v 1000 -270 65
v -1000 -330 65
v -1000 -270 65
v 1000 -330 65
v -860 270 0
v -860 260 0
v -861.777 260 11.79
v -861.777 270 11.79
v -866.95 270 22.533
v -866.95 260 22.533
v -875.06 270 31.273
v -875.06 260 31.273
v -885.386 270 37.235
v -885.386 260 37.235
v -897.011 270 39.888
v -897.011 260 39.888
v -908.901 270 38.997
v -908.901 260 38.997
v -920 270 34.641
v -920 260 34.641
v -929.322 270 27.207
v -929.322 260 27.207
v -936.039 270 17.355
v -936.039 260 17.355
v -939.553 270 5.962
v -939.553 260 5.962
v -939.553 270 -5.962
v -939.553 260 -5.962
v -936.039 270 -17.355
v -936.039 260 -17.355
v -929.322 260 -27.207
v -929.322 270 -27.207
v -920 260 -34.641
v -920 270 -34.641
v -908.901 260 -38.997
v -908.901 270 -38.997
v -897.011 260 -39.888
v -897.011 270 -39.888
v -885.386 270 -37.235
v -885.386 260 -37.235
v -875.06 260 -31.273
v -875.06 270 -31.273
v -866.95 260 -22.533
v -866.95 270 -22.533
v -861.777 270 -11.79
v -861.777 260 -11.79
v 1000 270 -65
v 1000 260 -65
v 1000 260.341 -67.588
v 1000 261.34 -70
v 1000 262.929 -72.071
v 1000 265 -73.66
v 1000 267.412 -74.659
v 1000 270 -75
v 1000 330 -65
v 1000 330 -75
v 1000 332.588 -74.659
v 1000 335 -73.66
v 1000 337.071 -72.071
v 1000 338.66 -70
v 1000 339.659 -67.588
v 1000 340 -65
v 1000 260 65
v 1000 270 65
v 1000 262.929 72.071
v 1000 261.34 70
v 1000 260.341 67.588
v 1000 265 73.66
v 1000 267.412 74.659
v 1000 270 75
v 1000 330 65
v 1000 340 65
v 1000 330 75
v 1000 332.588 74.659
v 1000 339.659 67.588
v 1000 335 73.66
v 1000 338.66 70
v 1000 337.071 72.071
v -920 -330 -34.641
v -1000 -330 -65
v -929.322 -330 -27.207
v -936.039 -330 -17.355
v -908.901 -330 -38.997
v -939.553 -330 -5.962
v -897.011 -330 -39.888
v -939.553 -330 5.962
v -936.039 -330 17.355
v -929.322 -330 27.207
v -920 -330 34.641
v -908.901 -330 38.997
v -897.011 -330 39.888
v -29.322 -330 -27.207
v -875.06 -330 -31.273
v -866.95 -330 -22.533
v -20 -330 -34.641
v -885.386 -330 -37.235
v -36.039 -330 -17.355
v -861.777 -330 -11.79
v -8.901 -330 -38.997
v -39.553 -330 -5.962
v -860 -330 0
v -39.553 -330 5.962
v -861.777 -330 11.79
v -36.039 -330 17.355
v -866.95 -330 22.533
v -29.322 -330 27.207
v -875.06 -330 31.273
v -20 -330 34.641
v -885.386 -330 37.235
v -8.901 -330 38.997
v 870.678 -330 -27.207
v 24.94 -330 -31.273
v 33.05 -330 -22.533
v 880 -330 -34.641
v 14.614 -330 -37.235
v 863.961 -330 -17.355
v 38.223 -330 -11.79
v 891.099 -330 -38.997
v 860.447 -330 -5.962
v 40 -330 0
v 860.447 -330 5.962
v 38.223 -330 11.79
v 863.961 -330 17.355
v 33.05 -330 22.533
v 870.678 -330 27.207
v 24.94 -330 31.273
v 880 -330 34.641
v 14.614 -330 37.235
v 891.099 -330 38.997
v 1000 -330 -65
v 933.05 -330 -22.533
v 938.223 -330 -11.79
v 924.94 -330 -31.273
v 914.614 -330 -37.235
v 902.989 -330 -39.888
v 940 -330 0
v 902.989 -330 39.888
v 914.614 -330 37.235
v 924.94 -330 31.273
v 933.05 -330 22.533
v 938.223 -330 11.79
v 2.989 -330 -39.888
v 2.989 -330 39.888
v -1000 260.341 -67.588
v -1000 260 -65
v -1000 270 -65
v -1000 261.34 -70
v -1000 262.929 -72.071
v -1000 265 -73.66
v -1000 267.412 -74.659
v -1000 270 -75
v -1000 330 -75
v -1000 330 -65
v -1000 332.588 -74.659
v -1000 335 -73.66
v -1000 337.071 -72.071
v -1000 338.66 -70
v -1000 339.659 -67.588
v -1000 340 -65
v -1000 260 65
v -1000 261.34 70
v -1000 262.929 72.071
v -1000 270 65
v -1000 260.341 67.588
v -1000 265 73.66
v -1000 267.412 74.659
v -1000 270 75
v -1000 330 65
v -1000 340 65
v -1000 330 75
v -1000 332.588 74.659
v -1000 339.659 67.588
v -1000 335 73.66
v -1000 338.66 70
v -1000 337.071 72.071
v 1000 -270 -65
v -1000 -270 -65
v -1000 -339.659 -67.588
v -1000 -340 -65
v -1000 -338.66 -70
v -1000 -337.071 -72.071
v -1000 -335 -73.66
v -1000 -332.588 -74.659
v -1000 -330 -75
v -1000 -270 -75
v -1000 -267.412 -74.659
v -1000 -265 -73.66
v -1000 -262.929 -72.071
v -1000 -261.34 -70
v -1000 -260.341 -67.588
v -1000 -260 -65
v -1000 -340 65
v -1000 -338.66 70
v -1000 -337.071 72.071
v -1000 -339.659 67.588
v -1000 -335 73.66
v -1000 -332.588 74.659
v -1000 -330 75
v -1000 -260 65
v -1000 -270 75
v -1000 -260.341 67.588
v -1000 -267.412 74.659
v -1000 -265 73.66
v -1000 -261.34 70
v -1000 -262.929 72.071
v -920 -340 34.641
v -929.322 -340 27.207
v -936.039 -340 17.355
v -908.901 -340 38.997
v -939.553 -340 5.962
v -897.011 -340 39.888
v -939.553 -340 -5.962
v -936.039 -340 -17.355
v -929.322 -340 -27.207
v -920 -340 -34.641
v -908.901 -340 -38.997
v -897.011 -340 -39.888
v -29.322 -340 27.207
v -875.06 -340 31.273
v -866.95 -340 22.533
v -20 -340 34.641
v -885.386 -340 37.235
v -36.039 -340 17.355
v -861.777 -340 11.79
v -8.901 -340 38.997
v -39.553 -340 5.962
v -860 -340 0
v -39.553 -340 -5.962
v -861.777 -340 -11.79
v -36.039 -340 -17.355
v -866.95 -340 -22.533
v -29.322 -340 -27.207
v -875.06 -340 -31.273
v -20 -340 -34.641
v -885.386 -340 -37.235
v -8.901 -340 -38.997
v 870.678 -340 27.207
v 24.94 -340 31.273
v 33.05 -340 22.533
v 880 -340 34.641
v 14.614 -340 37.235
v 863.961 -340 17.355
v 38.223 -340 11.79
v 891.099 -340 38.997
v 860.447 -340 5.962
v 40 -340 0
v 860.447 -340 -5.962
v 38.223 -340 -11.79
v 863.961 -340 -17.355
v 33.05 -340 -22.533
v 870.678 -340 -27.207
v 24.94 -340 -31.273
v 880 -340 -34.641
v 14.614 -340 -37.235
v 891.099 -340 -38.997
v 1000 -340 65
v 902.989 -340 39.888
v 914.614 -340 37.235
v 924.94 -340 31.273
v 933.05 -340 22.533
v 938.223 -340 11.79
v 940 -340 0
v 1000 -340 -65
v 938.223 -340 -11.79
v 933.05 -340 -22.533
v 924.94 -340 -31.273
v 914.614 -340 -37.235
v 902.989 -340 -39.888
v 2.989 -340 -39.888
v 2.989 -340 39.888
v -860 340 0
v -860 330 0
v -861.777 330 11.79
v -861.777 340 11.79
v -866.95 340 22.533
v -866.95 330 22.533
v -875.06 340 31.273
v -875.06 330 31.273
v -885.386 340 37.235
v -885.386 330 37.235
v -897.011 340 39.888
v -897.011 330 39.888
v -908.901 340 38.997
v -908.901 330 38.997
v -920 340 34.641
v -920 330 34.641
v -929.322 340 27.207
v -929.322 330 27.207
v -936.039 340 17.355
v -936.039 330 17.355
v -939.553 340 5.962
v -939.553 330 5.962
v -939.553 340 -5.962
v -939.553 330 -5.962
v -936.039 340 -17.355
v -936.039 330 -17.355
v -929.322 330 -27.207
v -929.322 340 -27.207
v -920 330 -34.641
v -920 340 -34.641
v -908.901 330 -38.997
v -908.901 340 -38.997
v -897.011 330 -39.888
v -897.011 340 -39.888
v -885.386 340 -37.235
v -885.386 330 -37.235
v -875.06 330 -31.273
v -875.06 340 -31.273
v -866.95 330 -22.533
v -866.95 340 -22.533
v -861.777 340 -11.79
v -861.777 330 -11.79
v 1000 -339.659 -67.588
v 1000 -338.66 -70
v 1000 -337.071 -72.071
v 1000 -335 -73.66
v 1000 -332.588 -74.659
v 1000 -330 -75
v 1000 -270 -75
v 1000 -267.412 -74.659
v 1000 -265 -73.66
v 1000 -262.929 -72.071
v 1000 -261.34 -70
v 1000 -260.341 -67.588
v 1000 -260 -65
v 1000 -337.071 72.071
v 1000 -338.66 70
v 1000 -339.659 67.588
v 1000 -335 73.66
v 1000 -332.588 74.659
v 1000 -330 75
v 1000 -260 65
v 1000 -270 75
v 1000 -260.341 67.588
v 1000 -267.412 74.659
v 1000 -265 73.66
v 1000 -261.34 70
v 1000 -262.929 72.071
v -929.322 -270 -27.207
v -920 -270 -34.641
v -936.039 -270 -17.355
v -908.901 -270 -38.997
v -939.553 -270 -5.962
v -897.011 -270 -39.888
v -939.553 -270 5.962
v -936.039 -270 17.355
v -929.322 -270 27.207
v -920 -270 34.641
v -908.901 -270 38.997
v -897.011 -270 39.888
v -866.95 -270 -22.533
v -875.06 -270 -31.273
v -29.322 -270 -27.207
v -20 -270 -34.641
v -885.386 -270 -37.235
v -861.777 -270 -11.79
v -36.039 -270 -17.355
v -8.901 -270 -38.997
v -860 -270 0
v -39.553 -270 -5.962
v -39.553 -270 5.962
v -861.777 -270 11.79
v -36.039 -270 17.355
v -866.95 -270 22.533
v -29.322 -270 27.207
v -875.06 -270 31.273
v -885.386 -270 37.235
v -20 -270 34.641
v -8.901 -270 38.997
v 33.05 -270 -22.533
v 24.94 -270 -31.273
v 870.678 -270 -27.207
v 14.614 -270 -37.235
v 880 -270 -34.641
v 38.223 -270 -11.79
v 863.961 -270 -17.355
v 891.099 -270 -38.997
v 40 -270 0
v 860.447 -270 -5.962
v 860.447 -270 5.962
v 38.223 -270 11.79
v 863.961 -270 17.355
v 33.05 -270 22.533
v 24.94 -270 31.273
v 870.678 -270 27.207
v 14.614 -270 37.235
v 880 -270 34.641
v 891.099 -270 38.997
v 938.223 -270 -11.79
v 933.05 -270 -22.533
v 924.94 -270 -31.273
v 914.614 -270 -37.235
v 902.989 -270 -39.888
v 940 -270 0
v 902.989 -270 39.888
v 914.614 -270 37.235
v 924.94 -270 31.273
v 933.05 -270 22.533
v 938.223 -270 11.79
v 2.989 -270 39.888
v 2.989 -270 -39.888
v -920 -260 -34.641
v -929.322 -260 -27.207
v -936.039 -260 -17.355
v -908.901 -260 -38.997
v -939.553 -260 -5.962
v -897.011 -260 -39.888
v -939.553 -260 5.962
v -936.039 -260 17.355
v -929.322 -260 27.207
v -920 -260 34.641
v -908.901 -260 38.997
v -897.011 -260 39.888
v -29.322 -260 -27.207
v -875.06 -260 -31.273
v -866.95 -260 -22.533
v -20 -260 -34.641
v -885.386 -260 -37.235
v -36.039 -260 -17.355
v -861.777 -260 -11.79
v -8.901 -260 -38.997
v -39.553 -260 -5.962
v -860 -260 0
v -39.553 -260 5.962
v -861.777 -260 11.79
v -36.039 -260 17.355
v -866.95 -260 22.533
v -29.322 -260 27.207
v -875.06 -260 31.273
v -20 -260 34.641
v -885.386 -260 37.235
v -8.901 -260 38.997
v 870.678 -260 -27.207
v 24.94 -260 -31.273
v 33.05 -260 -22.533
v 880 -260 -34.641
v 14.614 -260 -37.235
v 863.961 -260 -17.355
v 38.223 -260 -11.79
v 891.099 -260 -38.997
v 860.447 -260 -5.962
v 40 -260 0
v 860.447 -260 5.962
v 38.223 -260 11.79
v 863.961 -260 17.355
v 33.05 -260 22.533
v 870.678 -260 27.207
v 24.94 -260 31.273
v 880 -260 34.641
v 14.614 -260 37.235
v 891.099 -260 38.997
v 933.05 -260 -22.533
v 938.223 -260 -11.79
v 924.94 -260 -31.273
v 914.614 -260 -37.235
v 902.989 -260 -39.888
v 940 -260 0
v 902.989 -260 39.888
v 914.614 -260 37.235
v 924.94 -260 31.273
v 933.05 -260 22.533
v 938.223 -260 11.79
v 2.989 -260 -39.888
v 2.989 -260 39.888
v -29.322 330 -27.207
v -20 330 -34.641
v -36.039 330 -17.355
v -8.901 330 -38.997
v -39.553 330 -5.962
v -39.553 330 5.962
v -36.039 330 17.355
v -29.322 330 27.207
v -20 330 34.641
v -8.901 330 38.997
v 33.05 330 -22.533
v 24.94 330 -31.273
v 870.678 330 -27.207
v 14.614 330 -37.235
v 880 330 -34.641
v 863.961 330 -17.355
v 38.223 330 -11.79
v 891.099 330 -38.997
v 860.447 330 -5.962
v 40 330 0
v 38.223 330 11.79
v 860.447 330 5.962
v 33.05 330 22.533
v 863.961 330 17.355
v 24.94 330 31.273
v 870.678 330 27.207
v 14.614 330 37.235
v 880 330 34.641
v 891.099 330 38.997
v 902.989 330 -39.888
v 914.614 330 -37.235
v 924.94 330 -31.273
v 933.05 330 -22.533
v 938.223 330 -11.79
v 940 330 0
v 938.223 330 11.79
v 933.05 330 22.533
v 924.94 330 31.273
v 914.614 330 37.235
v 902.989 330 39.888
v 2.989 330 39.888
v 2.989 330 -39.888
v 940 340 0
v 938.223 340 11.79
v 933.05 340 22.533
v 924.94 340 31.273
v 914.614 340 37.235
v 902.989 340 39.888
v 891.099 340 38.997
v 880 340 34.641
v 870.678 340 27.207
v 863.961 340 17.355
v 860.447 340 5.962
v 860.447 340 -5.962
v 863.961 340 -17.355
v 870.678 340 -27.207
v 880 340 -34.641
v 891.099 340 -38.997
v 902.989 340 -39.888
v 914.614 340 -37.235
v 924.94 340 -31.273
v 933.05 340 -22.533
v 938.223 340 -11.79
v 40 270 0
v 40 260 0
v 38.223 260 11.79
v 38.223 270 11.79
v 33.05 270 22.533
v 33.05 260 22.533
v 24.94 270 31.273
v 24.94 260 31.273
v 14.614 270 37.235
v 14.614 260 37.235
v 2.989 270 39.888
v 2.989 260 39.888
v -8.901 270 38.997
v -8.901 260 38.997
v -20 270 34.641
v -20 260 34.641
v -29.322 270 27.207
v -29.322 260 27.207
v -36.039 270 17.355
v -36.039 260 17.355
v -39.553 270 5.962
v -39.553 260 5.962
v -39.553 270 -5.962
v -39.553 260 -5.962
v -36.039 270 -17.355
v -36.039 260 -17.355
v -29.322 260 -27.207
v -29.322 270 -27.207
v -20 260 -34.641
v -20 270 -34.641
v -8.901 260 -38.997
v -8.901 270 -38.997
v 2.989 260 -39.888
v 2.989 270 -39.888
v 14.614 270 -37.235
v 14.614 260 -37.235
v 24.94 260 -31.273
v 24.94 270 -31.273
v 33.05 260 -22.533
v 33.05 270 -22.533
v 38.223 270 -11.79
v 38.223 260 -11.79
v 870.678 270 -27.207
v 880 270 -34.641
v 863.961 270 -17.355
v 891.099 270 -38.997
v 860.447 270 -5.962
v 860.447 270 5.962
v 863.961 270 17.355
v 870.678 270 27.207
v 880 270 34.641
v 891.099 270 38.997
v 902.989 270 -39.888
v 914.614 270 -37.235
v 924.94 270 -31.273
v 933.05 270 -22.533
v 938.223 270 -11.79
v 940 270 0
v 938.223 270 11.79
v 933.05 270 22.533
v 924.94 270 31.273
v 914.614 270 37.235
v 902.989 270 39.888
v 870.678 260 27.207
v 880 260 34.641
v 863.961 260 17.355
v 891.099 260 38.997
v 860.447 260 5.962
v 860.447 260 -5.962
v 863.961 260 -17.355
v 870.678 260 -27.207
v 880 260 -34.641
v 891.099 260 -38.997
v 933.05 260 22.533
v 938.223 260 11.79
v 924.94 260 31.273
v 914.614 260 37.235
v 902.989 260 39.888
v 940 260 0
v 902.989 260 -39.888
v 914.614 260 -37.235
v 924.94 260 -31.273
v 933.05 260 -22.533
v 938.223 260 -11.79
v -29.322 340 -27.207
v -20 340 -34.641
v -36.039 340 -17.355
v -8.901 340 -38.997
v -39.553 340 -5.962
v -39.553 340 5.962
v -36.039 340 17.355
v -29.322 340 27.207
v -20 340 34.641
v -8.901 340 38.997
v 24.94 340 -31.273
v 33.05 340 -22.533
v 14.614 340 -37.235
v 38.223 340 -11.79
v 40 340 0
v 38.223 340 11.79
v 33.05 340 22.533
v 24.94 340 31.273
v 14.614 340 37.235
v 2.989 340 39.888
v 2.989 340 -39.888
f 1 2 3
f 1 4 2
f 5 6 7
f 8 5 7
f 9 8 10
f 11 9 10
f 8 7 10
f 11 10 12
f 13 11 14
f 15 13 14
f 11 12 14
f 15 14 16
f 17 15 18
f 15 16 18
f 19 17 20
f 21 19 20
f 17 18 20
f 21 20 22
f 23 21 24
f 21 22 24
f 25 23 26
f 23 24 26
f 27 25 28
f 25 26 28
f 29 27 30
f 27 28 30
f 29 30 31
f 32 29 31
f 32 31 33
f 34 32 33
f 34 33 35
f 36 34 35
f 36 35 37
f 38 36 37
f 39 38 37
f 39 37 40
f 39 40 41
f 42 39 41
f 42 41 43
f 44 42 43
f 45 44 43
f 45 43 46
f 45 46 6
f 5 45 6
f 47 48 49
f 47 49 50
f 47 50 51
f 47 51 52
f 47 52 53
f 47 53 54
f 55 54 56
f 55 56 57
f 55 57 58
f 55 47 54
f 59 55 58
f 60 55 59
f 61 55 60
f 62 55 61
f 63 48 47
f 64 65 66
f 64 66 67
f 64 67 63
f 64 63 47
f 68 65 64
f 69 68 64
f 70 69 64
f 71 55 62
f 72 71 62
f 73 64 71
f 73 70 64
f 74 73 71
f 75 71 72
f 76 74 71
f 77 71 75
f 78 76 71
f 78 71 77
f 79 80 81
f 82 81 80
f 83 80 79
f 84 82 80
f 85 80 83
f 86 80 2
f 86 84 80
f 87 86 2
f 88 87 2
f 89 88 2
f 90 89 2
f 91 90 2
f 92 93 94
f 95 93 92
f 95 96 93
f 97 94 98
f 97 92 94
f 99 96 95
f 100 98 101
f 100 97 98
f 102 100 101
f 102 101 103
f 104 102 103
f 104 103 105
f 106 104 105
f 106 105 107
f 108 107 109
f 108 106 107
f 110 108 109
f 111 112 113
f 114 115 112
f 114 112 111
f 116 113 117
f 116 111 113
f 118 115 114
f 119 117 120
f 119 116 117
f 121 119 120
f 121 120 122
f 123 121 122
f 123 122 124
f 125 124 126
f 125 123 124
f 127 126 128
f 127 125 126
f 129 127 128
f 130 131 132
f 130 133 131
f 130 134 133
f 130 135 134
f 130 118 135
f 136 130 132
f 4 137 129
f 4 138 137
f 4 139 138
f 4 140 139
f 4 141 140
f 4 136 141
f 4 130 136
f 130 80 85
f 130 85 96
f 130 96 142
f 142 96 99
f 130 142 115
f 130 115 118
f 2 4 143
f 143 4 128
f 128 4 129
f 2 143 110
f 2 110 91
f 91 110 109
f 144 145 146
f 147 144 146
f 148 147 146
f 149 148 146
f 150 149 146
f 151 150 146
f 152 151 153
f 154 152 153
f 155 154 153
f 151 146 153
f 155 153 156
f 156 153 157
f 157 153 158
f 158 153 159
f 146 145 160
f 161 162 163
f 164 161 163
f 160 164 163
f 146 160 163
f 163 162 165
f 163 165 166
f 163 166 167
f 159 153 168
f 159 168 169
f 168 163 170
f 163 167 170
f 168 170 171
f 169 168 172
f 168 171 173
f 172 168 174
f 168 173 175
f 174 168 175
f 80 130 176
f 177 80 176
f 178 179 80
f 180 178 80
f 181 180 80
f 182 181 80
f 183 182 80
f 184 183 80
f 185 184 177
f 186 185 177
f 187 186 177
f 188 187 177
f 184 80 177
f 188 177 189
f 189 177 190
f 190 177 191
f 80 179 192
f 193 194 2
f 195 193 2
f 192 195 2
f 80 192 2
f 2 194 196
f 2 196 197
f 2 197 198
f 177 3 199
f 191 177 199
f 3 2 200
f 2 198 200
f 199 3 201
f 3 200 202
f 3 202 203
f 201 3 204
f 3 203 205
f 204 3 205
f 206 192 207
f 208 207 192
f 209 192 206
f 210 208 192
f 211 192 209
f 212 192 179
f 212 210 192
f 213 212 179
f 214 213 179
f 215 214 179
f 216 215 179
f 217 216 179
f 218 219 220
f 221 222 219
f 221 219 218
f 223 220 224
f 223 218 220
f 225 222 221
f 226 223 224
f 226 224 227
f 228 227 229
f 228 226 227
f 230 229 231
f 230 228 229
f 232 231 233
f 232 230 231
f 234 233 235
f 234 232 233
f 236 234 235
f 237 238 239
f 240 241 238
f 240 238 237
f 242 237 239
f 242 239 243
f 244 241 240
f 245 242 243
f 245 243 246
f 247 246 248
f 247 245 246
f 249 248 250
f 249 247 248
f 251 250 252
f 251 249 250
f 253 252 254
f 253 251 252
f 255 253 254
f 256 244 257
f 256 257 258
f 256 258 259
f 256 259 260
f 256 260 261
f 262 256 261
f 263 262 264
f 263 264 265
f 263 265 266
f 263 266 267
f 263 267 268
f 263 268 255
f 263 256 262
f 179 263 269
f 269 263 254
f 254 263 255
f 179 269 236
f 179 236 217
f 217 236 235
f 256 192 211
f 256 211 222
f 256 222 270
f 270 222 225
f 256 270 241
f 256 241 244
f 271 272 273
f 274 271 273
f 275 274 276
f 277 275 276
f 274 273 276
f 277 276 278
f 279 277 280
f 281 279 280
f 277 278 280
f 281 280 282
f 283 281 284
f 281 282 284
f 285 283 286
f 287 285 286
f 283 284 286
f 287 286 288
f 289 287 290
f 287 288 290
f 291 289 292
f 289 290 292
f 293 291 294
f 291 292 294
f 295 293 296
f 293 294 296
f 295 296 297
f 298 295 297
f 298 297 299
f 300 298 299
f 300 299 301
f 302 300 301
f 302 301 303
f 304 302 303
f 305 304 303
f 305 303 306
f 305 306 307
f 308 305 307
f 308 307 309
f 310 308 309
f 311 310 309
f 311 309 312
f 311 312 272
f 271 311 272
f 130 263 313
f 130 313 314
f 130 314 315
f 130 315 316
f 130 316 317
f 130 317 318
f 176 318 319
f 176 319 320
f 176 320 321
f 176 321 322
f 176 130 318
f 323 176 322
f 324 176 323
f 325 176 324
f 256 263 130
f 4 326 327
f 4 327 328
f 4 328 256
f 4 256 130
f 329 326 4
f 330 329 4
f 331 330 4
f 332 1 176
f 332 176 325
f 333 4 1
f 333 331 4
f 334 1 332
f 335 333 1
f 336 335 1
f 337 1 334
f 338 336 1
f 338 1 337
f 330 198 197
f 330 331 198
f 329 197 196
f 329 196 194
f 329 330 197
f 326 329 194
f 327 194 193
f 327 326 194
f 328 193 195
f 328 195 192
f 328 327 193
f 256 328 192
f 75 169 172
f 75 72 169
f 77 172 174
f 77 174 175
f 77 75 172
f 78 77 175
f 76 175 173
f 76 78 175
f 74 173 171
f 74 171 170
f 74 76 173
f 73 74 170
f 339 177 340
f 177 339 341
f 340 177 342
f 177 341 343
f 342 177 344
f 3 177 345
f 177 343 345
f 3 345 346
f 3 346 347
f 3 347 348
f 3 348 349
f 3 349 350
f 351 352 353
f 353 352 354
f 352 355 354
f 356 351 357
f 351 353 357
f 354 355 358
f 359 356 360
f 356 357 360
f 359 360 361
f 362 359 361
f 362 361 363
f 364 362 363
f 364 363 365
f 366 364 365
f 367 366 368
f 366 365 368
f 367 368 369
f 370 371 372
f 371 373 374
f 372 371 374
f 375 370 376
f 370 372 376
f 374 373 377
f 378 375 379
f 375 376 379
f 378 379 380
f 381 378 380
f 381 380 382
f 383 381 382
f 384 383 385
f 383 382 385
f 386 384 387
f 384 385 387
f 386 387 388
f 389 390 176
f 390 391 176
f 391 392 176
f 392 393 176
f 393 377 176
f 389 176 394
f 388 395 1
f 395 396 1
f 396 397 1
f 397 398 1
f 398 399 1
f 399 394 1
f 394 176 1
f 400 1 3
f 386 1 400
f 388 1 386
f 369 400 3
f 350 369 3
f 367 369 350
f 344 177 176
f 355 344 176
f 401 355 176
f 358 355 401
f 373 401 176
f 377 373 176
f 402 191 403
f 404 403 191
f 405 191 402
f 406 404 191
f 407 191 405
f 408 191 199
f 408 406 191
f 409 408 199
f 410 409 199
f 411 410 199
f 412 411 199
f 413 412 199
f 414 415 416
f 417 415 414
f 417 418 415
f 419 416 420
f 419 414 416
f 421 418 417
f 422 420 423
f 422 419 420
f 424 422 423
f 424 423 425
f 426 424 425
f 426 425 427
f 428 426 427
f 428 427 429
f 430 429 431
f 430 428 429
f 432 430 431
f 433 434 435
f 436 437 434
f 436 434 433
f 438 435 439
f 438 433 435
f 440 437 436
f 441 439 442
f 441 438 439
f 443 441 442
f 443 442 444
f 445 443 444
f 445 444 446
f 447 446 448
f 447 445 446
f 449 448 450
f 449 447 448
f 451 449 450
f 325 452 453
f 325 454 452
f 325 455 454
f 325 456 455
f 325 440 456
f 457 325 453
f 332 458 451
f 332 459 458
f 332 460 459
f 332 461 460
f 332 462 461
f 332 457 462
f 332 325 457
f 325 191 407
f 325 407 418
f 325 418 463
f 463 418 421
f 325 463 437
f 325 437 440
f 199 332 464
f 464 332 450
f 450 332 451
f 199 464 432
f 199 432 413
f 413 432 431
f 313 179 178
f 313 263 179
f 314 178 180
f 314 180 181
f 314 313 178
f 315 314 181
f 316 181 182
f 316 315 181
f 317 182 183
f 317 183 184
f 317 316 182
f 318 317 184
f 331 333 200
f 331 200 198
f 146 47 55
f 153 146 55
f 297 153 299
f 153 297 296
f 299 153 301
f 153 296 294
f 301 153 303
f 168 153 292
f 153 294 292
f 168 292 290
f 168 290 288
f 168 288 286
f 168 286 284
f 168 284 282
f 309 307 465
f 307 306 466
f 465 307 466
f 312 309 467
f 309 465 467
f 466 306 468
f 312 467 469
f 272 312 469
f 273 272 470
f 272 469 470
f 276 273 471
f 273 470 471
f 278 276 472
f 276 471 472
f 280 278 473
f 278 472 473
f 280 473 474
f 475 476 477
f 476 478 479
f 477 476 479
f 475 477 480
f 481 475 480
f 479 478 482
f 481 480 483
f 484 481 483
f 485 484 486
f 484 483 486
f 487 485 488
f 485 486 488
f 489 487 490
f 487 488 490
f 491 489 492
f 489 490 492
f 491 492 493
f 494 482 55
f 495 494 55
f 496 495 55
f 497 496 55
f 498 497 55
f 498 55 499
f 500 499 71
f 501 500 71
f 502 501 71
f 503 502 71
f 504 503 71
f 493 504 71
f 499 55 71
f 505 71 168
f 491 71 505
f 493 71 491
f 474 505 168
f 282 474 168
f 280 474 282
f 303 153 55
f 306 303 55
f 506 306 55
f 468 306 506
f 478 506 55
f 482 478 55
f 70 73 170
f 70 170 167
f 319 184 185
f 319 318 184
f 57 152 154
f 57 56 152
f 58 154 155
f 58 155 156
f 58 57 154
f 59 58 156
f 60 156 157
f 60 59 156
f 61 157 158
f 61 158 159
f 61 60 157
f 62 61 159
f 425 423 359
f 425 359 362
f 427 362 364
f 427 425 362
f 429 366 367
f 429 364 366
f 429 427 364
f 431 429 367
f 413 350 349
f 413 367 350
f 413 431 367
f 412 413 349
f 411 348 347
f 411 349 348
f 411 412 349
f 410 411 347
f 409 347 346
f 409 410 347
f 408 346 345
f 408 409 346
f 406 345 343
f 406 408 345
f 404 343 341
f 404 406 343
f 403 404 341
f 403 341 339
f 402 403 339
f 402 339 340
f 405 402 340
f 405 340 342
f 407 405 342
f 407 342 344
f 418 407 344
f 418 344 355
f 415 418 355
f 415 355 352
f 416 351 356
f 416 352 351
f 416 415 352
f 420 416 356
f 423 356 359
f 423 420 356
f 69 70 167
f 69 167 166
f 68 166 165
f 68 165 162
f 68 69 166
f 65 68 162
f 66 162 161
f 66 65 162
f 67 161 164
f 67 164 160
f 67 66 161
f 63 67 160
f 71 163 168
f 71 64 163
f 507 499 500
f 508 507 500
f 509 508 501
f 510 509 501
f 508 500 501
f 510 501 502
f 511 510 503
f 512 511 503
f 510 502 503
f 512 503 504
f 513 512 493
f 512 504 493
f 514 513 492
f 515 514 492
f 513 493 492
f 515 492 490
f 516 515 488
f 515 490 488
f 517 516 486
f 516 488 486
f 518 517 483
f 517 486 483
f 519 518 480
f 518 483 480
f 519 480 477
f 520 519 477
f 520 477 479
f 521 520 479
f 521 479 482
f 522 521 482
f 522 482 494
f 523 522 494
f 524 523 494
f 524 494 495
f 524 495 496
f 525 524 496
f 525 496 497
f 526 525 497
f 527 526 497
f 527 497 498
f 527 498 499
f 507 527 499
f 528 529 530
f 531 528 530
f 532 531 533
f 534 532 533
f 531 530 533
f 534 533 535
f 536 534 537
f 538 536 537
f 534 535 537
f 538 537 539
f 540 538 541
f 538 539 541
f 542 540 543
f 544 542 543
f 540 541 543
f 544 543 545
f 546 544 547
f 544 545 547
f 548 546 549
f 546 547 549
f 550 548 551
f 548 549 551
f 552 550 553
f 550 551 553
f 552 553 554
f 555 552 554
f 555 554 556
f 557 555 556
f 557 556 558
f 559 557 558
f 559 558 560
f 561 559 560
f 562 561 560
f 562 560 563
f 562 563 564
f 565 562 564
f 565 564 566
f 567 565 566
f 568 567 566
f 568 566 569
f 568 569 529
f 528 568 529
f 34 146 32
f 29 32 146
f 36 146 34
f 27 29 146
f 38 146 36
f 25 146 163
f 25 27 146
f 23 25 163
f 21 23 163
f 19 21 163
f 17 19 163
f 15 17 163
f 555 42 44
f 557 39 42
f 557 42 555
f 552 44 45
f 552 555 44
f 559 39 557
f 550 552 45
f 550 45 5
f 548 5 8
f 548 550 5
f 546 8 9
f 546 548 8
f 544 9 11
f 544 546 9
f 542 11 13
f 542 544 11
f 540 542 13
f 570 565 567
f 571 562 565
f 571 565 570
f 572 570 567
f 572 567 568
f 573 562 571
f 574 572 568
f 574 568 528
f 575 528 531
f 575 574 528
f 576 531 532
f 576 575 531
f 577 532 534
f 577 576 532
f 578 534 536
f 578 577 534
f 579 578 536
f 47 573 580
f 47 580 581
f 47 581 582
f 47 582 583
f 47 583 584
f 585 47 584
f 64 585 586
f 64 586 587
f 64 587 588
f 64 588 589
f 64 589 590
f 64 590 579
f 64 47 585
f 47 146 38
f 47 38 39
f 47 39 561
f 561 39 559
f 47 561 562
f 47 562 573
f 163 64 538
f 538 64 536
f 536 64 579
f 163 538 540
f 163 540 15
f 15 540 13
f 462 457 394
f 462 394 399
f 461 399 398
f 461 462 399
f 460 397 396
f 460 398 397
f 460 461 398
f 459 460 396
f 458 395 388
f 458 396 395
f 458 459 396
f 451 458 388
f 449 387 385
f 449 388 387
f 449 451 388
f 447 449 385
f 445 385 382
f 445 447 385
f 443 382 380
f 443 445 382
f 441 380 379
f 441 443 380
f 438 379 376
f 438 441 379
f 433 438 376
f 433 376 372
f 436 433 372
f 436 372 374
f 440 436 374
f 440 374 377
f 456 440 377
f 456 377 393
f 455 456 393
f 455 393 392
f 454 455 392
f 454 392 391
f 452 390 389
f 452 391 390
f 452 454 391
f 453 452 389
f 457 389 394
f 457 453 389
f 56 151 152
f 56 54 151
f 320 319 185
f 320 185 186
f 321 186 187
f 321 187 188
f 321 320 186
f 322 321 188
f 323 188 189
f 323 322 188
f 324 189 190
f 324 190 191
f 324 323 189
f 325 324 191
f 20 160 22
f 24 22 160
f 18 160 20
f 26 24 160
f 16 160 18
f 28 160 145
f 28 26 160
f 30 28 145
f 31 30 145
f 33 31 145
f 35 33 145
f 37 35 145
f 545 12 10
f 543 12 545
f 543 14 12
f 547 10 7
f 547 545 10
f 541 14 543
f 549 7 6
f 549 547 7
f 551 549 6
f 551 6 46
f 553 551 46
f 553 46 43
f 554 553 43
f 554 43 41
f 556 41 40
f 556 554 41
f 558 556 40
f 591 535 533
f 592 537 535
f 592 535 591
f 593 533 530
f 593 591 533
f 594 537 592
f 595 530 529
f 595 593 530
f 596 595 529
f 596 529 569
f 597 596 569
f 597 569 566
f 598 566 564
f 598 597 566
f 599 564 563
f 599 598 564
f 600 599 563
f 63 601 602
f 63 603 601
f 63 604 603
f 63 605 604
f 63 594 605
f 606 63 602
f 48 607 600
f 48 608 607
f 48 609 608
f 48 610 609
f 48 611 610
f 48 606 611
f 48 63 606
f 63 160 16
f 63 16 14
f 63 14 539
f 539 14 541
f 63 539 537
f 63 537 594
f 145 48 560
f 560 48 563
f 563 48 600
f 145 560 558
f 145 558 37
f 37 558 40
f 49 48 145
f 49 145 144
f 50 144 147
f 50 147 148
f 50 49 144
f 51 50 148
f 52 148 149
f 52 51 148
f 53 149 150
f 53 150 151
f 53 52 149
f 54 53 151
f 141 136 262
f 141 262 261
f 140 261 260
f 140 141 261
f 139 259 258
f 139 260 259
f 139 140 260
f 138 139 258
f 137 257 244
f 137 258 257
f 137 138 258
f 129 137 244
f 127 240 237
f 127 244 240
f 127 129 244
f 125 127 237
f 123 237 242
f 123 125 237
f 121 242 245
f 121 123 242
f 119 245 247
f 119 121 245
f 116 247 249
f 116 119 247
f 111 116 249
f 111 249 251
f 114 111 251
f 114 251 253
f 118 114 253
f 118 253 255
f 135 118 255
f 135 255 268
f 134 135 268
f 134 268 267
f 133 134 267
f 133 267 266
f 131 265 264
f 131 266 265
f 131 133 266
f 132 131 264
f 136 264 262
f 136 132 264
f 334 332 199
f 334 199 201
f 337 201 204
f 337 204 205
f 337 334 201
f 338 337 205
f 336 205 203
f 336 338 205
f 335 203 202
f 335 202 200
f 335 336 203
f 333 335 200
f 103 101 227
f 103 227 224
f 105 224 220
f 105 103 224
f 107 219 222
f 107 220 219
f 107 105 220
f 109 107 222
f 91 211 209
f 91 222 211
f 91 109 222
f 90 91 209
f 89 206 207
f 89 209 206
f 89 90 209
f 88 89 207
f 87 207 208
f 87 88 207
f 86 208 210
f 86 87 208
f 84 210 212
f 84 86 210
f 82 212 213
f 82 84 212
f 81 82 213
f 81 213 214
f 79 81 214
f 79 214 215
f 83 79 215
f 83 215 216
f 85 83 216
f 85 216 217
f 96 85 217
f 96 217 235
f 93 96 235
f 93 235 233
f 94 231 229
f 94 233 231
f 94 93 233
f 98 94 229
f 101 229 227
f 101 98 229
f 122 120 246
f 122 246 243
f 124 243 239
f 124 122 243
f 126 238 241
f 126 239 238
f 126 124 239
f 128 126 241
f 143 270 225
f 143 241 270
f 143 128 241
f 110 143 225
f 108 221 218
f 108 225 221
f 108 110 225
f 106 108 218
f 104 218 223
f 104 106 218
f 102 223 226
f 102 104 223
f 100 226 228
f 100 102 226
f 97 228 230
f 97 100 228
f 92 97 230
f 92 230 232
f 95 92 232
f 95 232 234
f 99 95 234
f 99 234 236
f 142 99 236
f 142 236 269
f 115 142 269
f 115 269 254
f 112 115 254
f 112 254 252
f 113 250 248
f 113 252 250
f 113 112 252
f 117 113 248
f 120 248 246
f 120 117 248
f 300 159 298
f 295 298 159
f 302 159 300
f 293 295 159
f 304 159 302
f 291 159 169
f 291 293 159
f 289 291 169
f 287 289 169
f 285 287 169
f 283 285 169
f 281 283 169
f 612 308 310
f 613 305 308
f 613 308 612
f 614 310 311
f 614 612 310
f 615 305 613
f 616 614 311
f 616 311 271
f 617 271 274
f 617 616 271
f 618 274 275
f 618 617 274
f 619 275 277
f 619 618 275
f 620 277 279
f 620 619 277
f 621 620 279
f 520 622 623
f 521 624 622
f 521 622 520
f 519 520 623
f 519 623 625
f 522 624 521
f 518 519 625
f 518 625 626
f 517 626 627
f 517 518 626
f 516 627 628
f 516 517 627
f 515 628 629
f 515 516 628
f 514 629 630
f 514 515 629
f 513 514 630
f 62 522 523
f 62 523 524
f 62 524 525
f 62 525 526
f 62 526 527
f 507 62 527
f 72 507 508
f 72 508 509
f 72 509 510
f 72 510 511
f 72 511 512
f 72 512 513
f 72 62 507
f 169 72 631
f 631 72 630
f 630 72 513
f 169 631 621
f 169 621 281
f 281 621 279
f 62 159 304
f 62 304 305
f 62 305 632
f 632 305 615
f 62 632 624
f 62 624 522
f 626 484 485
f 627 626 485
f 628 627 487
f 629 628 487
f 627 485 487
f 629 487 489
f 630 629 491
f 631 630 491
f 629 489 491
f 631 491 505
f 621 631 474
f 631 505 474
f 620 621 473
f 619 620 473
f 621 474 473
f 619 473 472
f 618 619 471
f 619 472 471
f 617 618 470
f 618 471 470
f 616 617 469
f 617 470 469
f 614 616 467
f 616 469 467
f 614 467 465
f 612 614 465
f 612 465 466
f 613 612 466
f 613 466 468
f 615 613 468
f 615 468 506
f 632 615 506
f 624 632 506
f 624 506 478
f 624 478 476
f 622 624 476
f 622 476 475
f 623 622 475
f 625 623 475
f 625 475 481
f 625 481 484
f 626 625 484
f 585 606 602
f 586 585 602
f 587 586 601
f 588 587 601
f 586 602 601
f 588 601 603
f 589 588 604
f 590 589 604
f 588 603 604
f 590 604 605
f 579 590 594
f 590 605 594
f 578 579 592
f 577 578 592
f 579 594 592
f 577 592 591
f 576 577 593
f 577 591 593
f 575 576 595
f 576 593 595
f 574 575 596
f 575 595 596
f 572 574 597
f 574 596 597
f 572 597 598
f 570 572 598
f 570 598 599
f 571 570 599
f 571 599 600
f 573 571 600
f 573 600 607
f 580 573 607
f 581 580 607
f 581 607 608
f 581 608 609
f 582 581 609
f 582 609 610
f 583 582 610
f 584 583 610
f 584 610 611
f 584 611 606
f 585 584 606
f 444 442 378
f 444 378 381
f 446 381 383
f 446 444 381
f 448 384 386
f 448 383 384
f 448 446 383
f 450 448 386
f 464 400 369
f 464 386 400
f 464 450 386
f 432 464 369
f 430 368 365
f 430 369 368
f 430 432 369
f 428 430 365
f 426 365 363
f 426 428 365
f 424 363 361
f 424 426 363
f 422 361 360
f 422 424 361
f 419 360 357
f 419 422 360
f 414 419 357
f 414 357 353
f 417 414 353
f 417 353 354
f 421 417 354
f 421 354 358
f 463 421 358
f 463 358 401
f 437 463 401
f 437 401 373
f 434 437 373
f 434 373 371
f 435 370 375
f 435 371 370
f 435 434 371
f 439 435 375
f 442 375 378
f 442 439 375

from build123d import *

# Parameters (mm, degrees)
F0_W          = 60
F0_H          = 130
F1_DEPTH      = 1000
F2_R          = 40
F3_DEPTH      = 340.001
F3_DEPTH_BACK = 340.001


with BuildPart() as f1:
    # F0 (on Right) → F1 (new body, symmetric)
    with BuildSketch(Plane.YZ):
        with BuildLine():
            Line((-330, -75), (-270, -75))
            ThreePointArc((-270, -75), (-262.9289321881, -72.0710678119), (-260, -65))
            Line((-260, -65), (-260, 65))
            ThreePointArc((-260, 65), (-262.9289321881, 72.0710678119), (-270, 75))
            Line((-270, 75), (-330, 75))
            ThreePointArc((-330, 75), (-337.0710678119, 72.0710678119), (-340, 65))
            Line((-340, 65), (-340, -65))
            ThreePointArc((-340, -65), (-337.0710678119, -72.0710678119), (-330, -75))
        make_face()
        with Locations((-300, 0)):
            Rectangle(F0_W, F0_H, mode=Mode.SUBTRACT)
    extrude(amount=F1_DEPTH, both=True)


with BuildPart() as f1b:
    # F0 (on Right) → F1, piece 2 (new body, symmetric)
    with BuildSketch(Plane.YZ):
        with BuildLine():
            ThreePointArc((340, 65), (337.0710678119, 72.0710678119), (330, 75))
            Line((330, 75), (270, 75))
            ThreePointArc((270, 75), (262.9289321881, 72.0710678119), (260, 65))
            Line((260, 65), (260, -65))
            ThreePointArc((260, -65), (262.9289321881, -72.0710678119), (270, -75))
            Line((270, -75), (330, -75))
            ThreePointArc((330, -75), (337.0710678119, -72.0710678119), (340, -65))
            Line((340, -65), (340, 65))
        make_face()
        with Locations((300, 0)):
            Rectangle(F0_W, F0_H, mode=Mode.SUBTRACT)
    extrude(amount=F1_DEPTH, both=True)


with BuildPart() as f3_tool:
    # F2 (on Front) → F3 (new body, two sides)
    with BuildSketch(Plane.XZ) as f3_sk:
        with Locations((900, 0)):
            Circle(F2_R)
        Circle(F2_R)
        with Locations((-900, 0)):
            Circle(F2_R)
    extrude(amount=-F3_DEPTH)
    extrude(f3_sk.sketch, amount=F3_DEPTH_BACK)


with BuildPart() as f1_1:
    add(f1.part)

    # F3: cut by f3_tool
    add(f3_tool.part, mode=Mode.SUBTRACT)


with BuildPart() as f1b_1:
    add(f1b.part)

    # F3: cut by f3_tool
    add(f3_tool.part, mode=Mode.SUBTRACT)


solid = Compound([f1_1.part, f1b_1.part])
